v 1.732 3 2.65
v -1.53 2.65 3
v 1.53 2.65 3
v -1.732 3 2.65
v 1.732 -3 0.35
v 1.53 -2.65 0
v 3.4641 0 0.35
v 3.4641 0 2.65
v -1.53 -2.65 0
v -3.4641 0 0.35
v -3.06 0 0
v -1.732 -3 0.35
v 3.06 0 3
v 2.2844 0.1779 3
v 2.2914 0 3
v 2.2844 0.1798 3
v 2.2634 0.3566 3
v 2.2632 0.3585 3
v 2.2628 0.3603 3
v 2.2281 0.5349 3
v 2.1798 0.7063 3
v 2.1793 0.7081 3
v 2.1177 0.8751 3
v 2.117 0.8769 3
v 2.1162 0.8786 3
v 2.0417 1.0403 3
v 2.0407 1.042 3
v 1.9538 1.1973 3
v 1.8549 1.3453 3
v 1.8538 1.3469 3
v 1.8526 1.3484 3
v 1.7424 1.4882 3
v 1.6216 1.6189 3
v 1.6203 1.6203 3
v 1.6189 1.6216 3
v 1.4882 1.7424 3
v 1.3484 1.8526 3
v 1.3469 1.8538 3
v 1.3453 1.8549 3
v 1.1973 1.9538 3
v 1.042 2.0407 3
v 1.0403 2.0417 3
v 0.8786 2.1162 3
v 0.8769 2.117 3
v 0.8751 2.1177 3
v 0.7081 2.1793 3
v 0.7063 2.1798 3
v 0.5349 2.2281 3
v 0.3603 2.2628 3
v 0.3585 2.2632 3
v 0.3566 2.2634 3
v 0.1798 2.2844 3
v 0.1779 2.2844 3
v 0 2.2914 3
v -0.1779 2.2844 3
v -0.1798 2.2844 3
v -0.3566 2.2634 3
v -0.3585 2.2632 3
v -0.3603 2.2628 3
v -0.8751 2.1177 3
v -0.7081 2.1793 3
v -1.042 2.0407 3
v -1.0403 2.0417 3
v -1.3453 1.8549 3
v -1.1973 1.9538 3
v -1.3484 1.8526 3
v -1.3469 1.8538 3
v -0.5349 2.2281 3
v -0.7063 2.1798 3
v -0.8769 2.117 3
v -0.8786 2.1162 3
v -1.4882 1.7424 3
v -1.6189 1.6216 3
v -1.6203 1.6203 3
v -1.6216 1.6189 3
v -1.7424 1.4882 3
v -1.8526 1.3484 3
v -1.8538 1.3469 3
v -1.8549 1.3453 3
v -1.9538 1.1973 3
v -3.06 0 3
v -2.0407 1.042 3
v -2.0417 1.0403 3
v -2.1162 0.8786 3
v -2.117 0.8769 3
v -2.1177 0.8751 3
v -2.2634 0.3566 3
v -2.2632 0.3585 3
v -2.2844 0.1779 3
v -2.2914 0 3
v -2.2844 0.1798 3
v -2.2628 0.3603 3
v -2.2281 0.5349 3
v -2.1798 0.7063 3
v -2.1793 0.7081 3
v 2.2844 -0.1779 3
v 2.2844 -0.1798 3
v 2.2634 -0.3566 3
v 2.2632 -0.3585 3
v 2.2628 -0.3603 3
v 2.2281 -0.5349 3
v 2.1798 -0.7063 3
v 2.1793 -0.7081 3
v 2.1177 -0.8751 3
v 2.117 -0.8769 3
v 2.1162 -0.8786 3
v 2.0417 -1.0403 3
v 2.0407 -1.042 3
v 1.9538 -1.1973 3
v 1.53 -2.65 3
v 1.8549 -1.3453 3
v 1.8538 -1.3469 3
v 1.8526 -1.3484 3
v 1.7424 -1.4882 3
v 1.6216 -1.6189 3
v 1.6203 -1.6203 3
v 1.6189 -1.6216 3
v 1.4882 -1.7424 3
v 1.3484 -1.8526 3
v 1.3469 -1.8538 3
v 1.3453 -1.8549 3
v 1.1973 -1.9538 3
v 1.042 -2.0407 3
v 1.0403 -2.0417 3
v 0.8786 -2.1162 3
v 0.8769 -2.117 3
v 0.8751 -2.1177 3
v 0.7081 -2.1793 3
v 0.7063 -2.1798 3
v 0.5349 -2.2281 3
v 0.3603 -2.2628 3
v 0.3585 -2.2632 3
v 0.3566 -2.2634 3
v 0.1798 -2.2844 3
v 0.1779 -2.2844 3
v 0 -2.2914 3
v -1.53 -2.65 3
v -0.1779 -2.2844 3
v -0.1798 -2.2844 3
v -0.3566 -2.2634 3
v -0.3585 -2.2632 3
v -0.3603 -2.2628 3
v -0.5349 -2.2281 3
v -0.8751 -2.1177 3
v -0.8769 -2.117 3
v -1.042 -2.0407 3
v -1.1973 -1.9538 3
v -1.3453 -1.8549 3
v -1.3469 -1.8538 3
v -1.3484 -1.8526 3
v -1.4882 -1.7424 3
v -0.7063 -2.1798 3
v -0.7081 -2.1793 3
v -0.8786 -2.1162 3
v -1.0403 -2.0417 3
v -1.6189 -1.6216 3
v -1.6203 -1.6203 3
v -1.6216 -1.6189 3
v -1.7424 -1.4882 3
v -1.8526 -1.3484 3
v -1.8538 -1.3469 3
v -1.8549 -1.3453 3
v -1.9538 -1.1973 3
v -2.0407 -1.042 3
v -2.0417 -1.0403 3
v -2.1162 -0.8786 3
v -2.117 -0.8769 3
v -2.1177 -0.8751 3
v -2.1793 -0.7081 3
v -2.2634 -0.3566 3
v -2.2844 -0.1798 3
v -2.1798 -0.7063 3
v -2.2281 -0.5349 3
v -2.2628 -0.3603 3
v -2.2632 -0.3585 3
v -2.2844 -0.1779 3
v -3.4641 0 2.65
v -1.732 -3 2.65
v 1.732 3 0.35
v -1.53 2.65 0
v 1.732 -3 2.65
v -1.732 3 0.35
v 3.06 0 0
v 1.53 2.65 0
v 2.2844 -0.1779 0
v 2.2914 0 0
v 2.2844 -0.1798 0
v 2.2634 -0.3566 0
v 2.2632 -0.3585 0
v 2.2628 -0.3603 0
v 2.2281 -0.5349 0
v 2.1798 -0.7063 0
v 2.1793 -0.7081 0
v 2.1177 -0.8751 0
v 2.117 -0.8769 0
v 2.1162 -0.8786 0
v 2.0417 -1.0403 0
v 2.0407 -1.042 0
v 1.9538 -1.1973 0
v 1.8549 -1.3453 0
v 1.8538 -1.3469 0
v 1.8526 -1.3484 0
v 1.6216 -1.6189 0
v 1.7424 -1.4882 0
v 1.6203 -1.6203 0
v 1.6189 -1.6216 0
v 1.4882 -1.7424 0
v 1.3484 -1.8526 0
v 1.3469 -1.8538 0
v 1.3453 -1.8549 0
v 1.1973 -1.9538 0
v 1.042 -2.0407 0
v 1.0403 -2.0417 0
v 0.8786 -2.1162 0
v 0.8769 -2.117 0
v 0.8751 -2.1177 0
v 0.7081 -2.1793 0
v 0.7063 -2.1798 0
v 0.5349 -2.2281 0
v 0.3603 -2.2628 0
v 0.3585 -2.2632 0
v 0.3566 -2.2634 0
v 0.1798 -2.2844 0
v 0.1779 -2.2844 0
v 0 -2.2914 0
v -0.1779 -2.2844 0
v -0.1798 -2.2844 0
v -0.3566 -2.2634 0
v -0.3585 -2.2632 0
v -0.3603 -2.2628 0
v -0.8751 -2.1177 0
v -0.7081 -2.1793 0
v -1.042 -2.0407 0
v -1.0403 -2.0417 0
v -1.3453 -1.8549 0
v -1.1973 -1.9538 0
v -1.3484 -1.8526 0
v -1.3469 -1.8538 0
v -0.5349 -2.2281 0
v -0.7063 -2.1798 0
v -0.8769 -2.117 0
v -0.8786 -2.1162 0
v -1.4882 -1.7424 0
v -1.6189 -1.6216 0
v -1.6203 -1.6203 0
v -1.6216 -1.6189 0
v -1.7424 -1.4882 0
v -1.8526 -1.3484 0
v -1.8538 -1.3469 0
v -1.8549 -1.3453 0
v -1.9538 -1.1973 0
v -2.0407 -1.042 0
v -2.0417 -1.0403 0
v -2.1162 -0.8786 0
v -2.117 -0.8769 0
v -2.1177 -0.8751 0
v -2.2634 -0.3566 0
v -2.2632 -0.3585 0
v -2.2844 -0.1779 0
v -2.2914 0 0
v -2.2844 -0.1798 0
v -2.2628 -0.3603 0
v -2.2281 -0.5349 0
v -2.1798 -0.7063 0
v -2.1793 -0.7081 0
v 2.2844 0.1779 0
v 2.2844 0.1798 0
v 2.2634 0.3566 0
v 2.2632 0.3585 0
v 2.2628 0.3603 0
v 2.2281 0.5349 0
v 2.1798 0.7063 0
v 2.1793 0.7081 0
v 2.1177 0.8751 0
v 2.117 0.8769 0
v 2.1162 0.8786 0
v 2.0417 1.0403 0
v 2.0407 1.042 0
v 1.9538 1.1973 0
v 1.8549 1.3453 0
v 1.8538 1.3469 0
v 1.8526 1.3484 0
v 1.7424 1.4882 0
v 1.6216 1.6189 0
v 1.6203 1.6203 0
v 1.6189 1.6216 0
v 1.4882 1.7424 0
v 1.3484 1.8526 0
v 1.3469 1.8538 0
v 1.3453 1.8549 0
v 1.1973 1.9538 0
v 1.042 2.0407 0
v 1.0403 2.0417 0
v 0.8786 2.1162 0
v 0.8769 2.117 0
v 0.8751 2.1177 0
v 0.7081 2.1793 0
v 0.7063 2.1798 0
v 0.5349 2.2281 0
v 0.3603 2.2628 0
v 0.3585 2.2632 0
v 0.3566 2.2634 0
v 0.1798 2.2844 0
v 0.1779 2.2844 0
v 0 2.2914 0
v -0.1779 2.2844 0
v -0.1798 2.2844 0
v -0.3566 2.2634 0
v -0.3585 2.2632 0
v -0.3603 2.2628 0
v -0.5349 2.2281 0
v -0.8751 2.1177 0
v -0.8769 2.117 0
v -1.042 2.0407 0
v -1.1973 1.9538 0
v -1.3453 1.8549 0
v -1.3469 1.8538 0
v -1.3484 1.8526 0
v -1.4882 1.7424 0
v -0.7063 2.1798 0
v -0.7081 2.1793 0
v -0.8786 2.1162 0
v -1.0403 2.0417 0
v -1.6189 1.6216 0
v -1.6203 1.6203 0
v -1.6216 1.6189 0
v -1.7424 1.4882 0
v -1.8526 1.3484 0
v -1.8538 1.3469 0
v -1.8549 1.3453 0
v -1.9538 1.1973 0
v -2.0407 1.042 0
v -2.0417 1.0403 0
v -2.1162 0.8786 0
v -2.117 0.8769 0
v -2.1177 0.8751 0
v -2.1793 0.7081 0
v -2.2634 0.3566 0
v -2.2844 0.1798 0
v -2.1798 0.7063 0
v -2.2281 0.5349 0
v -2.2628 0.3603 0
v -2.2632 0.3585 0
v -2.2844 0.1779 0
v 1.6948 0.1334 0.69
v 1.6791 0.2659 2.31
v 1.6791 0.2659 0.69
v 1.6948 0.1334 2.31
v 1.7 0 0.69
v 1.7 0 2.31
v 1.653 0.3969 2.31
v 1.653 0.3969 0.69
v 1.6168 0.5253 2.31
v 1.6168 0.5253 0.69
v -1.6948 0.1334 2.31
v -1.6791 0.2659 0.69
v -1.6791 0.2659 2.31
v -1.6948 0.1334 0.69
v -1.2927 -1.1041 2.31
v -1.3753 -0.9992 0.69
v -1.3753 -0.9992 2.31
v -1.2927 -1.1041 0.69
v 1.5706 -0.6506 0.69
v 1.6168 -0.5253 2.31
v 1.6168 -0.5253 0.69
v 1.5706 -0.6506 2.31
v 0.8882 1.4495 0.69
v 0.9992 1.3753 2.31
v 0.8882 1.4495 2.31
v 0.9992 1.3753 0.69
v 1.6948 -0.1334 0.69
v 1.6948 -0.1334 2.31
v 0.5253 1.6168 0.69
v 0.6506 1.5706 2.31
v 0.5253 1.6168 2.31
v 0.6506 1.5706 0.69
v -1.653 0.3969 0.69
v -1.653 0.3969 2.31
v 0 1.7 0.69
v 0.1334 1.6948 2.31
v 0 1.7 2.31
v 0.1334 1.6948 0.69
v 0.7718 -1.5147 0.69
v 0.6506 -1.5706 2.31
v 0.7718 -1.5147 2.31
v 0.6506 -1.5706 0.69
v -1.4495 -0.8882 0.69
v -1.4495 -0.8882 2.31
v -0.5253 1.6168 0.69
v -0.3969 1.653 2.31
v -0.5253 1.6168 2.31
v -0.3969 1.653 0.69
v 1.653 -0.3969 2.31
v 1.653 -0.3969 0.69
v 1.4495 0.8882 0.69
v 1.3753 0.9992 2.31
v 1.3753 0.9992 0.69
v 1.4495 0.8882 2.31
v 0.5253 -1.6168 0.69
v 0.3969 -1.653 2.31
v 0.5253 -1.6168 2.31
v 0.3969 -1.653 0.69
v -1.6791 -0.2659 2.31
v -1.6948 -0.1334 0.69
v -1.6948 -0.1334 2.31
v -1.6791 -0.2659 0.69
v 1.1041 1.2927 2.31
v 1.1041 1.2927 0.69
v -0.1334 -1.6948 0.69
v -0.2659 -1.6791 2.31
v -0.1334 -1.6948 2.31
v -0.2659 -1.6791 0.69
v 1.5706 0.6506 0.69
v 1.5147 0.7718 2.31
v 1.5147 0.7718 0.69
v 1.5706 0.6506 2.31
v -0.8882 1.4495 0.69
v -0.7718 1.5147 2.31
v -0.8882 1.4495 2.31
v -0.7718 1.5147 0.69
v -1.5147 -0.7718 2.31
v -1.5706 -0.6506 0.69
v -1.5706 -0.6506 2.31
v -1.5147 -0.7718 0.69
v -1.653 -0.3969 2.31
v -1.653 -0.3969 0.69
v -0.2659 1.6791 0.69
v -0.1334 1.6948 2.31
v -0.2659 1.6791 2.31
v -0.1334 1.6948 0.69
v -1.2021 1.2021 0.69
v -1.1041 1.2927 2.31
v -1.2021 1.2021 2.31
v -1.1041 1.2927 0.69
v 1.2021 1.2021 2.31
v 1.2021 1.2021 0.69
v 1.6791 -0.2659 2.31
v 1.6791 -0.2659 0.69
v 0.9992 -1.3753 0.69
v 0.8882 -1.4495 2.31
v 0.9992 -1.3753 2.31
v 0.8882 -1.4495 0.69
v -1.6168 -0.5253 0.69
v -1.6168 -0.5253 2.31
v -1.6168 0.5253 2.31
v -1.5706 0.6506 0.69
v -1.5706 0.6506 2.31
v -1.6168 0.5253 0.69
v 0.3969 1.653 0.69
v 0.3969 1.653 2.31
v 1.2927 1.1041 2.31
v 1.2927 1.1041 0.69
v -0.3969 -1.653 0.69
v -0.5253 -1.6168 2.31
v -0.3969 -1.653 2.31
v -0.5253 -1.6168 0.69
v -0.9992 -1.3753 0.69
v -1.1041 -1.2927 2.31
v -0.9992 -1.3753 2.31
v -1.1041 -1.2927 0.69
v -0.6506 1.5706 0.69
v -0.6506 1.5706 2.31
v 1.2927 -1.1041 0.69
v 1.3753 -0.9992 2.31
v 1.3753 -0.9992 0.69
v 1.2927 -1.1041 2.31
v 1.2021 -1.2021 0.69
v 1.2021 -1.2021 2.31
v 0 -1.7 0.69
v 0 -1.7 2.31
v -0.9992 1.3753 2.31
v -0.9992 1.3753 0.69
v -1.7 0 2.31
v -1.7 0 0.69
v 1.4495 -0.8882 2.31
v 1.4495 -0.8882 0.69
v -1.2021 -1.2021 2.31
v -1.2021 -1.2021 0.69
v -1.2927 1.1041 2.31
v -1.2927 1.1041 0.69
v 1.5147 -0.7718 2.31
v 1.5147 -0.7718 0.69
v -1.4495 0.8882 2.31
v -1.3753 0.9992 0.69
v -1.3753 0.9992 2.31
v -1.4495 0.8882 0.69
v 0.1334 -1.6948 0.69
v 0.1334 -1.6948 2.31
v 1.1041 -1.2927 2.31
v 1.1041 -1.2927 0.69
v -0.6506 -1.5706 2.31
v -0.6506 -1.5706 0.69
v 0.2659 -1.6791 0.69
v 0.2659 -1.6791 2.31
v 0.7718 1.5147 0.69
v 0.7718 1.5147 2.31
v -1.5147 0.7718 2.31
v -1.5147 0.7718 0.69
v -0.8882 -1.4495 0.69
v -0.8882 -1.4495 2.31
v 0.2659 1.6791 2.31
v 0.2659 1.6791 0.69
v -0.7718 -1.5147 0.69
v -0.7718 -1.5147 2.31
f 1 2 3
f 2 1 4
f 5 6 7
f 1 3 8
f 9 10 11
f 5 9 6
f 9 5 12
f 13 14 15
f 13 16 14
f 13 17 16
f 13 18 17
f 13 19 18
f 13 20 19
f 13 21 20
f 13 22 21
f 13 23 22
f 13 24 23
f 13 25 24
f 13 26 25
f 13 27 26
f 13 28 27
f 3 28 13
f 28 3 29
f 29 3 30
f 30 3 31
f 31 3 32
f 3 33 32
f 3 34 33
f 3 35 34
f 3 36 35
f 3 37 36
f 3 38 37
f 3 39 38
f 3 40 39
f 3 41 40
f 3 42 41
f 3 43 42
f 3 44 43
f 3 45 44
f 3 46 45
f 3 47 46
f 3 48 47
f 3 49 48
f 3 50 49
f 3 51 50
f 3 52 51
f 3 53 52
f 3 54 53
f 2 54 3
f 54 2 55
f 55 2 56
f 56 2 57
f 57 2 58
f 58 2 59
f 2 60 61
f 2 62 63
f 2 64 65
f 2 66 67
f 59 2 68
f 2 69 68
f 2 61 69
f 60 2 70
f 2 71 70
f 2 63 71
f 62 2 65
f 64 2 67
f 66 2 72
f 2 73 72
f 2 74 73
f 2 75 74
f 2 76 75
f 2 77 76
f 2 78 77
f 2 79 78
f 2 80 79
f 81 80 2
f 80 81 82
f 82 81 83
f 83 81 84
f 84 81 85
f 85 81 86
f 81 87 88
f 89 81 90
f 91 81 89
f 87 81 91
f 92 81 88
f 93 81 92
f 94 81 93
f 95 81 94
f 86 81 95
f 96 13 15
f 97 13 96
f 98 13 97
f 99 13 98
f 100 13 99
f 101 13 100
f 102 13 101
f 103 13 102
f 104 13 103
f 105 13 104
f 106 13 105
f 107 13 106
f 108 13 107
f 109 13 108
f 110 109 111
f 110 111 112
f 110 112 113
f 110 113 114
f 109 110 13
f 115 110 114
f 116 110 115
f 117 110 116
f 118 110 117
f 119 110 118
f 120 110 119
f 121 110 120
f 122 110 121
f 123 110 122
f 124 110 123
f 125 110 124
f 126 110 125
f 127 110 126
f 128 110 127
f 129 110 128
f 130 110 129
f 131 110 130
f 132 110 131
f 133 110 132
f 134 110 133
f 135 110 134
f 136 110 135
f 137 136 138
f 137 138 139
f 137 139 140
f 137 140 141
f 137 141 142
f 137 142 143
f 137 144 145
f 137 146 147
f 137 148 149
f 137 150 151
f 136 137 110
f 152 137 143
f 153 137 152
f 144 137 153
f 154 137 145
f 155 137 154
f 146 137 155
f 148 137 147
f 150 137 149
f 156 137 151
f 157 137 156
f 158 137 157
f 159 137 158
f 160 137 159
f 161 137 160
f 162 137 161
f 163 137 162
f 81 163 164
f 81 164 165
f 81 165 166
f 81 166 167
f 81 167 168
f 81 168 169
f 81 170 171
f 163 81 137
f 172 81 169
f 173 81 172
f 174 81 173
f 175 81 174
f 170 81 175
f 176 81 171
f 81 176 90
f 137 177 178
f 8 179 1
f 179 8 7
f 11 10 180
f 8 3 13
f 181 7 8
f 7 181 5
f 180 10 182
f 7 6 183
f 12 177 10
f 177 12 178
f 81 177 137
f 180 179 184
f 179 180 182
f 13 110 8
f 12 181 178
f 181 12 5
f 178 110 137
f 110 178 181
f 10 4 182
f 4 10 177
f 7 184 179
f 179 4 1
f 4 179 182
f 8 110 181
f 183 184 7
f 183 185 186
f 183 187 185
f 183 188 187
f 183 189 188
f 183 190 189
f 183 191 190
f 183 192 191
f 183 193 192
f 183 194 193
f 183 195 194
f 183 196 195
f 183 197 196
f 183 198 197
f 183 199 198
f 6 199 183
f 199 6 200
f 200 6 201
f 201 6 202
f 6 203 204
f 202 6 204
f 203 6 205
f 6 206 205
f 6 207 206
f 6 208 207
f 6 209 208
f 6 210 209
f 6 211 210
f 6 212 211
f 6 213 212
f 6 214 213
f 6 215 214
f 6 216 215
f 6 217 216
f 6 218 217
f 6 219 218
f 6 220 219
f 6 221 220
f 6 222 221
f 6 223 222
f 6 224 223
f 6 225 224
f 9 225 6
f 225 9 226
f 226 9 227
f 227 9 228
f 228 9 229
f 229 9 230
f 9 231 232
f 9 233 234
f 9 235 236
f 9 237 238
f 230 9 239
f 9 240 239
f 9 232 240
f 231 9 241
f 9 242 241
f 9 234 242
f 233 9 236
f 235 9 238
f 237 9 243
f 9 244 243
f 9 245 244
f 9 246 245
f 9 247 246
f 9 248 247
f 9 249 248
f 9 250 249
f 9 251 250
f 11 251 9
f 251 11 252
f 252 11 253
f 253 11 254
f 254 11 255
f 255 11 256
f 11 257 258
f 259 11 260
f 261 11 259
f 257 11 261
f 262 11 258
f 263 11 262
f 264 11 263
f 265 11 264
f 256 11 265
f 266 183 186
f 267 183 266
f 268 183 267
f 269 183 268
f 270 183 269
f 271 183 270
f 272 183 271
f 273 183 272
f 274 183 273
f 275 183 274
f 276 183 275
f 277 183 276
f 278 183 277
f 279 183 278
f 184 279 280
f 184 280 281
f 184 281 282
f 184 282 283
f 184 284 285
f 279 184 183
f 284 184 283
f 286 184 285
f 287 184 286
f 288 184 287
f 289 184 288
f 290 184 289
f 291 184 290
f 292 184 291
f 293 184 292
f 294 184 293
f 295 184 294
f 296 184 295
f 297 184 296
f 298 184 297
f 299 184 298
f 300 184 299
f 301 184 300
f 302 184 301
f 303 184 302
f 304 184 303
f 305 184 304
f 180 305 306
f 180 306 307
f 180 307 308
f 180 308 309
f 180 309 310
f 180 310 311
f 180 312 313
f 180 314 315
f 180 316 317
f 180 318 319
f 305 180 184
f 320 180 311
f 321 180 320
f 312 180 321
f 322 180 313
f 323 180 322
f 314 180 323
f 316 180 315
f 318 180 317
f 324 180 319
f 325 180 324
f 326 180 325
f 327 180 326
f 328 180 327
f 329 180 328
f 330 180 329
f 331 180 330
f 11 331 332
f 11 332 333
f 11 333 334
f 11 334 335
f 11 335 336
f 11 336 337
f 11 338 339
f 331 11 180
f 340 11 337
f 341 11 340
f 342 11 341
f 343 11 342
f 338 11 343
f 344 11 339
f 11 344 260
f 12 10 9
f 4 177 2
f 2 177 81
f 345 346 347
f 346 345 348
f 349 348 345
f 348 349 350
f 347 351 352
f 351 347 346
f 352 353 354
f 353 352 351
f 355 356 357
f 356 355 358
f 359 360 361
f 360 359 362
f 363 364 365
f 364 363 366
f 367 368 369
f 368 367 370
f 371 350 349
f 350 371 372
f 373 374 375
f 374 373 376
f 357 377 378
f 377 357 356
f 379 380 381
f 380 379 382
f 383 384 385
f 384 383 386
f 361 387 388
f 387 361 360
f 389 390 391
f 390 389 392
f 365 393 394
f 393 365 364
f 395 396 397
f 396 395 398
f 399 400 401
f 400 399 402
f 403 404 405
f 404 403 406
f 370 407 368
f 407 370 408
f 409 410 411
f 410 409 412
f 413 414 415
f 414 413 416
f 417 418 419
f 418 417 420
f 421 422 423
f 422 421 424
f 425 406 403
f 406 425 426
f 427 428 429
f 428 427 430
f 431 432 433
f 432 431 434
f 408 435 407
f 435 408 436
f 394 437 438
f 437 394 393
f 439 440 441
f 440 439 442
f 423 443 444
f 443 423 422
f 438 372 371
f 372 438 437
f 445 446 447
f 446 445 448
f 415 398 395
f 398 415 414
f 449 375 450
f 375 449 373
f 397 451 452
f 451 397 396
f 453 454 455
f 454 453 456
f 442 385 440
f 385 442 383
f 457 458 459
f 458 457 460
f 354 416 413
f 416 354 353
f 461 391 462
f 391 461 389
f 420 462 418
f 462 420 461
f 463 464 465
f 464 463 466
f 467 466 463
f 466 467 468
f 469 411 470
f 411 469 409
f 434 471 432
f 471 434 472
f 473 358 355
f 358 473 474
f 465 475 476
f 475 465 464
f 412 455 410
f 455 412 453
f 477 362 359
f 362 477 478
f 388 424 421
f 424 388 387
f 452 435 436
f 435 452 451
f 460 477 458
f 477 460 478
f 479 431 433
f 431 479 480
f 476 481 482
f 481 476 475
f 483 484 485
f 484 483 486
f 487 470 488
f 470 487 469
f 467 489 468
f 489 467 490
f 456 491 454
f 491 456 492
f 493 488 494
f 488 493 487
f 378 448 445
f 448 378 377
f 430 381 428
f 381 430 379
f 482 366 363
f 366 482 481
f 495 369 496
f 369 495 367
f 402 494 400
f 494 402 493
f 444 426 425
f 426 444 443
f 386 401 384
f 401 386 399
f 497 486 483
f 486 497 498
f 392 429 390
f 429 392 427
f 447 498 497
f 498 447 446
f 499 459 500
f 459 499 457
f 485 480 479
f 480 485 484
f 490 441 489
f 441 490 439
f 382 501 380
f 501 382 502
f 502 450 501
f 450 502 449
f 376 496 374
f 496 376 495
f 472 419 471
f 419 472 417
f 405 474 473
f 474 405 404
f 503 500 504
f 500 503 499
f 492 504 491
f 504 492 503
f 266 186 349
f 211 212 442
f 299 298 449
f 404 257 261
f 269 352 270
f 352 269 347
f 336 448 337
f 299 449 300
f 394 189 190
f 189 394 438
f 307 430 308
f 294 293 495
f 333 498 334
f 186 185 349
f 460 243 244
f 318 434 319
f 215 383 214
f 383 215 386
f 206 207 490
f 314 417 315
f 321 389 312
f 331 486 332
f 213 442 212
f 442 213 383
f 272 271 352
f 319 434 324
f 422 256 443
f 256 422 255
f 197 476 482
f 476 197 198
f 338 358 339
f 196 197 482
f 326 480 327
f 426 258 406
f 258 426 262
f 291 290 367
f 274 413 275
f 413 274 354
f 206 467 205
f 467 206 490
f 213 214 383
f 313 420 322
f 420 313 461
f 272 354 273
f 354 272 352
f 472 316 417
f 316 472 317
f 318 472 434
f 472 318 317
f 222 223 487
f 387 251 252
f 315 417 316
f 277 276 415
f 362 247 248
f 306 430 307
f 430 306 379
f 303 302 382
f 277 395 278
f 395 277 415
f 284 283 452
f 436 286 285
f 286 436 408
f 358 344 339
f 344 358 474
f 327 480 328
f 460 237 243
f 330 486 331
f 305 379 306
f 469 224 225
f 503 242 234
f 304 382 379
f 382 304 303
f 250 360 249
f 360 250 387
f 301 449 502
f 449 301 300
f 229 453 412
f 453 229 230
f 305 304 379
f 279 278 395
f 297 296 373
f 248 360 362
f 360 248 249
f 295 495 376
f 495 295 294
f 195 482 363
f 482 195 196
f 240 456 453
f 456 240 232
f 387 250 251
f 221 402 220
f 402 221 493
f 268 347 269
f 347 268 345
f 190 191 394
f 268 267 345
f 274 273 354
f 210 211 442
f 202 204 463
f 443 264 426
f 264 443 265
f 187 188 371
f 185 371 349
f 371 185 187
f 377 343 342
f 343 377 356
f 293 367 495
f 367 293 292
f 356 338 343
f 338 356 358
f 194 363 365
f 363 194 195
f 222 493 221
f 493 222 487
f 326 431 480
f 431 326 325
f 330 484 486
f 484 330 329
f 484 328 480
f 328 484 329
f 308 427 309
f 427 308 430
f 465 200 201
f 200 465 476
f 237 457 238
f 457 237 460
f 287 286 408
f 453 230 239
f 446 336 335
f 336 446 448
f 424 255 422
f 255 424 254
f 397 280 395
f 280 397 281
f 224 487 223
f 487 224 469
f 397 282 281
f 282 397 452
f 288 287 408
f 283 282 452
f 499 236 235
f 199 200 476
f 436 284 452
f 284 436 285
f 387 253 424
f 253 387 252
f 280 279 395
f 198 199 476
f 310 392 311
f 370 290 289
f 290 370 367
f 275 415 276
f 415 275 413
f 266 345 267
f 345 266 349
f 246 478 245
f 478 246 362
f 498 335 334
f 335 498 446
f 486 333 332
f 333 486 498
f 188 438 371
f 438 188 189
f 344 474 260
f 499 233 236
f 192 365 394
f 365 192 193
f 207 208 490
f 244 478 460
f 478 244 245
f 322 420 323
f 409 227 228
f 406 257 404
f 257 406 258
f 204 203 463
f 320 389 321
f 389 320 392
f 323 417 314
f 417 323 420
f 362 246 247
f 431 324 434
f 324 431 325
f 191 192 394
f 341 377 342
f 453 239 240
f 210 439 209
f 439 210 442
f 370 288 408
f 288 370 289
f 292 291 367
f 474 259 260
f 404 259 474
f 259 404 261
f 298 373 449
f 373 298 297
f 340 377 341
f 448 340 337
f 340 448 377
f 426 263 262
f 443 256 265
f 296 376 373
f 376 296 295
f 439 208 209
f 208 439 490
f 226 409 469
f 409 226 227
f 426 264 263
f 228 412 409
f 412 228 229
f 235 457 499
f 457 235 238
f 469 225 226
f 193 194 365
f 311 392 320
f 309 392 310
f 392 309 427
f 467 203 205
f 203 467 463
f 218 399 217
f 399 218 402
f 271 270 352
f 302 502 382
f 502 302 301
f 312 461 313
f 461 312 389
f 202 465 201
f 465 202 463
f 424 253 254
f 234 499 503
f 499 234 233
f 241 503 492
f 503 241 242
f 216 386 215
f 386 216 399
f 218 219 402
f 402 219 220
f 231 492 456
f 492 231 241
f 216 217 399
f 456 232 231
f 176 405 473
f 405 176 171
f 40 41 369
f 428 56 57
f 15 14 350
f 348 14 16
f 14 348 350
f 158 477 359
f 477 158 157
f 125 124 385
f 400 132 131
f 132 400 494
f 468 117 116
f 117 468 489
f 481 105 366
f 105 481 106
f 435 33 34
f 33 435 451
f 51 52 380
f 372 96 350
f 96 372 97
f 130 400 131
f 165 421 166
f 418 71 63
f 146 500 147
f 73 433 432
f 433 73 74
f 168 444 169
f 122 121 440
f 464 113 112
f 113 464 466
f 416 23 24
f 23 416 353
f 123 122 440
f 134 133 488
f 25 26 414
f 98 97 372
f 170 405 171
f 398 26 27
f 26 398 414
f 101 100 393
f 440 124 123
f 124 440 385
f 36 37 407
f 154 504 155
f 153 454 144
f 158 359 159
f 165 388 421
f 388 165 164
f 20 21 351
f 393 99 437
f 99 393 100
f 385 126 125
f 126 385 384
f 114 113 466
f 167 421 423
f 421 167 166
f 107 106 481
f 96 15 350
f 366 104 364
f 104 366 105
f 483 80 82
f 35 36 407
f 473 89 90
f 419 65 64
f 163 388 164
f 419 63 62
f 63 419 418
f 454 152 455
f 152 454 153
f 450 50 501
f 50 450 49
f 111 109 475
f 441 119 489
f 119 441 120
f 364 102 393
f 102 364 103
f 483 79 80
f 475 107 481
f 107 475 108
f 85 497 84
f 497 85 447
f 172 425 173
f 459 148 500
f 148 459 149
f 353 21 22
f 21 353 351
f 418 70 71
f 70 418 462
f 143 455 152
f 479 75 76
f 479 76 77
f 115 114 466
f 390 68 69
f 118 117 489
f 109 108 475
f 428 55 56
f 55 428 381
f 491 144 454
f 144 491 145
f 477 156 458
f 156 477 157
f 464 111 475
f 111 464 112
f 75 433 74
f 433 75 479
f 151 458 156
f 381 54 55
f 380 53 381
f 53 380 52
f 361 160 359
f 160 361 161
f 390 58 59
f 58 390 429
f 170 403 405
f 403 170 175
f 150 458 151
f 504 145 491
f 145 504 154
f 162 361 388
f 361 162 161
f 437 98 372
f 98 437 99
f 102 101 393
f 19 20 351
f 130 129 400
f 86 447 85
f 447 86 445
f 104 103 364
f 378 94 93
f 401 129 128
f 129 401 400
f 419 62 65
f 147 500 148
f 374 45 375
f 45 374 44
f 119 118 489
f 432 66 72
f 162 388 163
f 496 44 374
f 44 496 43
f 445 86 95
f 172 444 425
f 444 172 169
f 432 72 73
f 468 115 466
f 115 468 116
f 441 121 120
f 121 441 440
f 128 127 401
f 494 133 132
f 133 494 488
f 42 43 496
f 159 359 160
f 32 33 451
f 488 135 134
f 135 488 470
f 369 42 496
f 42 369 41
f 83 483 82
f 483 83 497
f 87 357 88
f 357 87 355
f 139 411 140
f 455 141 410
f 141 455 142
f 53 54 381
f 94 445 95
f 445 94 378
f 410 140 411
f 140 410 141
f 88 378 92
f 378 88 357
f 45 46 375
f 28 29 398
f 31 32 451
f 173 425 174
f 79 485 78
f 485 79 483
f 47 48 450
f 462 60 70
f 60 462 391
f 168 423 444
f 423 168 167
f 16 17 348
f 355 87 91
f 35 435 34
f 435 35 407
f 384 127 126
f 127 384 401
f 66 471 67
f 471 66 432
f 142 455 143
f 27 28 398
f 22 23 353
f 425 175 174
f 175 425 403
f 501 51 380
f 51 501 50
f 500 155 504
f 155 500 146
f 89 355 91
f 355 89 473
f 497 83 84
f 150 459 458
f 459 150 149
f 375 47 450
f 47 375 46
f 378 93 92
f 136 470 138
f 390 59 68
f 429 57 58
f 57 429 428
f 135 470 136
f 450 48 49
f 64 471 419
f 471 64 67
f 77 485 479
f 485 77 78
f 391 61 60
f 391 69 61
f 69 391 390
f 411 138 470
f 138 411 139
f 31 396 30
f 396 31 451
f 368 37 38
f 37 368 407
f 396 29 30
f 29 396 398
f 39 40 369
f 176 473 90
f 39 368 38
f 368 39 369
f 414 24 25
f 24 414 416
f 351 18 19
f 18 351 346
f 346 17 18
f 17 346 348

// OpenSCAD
$fn = 80;

// Parameters (mm)
screw_d = 3.0;          // for M3 clearance
nut_af  = 6.0;          // across flats
thk     = 3.0;          // thickness

// Clearances
hole_d  = 3.4;          // typical M3 clearance
chamfer = 0.35;         // small edge chamfer

module hex_prism_af(af, h){
    // Hex with given across-flats (af)
    // For a regular hex, across-flats = 2*apothem = sqrt(3)*R (circumradius)
    R = af / sqrt(3);
    cylinder(h=h, r=R, $fn=6);
}

module tslot_nut(){
    difference(){
        // Body with slight chamfer via minkowski (kept small to remain renderable)
        // Use a simple chamfer approximation: hull of two hexes
        hull(){
            translate([0,0, chamfer]) hex_prism_af(nut_af, thk - 2*chamfer);
            hex_prism_af(nut_af - 2*chamfer, thk);
        }

        // Through hole
        translate([0,0,-0.5]) cylinder(h=thk+1.0, d=hole_d);

        // Light countersink on both sides for easier screw start
        translate([0,0,-0.01]) cylinder(h=0.7, d1=hole_d+1.2, d2=hole_d);
        translate([0,0,thk-0.69]) cylinder(h=0.7, d1=hole_d, d2=hole_d+1.2);
    }
}

tslot_nut();
